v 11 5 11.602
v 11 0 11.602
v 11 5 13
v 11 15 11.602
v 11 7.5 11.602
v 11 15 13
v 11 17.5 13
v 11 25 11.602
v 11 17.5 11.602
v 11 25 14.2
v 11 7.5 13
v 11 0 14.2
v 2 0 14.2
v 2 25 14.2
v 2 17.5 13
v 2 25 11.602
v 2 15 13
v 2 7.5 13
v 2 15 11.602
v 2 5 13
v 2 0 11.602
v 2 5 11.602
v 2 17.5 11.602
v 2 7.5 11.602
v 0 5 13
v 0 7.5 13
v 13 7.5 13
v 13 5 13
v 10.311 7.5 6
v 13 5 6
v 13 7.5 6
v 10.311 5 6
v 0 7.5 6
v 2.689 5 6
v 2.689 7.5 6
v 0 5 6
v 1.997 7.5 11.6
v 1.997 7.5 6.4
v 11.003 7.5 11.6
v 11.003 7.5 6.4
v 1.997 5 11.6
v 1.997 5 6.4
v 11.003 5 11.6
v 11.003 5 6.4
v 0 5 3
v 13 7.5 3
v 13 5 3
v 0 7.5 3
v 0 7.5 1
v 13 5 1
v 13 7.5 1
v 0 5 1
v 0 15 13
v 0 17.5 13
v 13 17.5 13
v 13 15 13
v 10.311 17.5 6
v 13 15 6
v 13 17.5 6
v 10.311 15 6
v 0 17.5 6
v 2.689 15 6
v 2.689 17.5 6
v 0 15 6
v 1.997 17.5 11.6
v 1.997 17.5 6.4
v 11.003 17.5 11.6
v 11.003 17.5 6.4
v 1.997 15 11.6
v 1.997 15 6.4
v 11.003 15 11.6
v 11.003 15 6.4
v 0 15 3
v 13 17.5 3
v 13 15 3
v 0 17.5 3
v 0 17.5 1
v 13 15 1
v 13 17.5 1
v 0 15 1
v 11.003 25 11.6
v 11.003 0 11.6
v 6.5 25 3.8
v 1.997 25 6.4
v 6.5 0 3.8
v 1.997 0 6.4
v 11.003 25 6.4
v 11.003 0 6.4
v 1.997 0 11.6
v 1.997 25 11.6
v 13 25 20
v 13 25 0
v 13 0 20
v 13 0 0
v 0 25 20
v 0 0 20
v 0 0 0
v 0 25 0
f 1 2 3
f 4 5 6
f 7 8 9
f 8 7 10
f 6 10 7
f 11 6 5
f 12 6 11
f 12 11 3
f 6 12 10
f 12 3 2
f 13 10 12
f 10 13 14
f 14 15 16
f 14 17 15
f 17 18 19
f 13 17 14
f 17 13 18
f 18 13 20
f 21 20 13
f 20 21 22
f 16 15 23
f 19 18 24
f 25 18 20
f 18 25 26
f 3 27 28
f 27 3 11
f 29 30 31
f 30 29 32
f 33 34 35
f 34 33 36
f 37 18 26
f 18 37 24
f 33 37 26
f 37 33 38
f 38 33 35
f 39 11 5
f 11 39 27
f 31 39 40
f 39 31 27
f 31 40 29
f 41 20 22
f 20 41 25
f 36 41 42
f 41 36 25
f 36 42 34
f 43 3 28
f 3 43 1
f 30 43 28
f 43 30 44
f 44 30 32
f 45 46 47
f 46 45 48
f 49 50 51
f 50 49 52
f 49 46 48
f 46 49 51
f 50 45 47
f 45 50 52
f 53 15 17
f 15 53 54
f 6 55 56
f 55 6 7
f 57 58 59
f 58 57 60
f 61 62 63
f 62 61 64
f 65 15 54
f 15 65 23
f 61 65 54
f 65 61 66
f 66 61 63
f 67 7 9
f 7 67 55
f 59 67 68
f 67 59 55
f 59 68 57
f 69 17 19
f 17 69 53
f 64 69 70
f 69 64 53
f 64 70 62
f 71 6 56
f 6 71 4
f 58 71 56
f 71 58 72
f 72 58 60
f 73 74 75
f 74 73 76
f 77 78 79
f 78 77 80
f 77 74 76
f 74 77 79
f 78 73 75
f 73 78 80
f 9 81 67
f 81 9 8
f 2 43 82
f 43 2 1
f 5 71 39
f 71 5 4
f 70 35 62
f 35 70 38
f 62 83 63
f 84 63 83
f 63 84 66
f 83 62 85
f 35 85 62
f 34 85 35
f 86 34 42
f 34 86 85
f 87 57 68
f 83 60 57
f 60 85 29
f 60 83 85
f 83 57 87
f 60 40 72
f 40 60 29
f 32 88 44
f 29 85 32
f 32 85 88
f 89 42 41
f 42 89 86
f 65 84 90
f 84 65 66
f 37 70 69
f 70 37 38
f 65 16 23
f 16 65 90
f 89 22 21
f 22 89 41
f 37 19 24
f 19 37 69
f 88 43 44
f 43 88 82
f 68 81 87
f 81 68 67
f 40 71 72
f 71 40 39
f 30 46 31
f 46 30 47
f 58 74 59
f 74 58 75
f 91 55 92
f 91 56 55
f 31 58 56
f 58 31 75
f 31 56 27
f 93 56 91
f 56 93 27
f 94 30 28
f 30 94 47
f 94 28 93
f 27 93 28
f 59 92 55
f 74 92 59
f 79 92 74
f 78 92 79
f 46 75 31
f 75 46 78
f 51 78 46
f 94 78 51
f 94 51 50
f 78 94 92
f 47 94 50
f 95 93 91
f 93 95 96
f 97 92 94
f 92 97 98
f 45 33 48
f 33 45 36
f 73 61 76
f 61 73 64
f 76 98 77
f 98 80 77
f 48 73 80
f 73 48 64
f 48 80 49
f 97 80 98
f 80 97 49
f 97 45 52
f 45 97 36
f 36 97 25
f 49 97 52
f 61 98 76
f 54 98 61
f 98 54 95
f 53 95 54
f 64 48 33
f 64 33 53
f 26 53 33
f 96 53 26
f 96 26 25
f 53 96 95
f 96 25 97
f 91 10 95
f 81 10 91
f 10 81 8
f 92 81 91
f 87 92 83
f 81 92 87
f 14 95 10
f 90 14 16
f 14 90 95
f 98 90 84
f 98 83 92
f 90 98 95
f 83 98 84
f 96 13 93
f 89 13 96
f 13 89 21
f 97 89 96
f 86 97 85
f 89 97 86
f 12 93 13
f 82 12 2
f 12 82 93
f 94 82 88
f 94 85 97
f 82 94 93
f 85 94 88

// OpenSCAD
difference(){cube([13,25,20]);

//rotate([0, -90, 0])
translate([0,0,1]){
translate([2, -1, 8]) cube([9,60,5.2]);
translate([-1, 5, 5]) cube([15,2.5,7]);
translate([-1, 5, 0]) cube([15,2.5,2]);

translate([-1, 15, 5]) cube([15,2.5,7]);
translate([-1, 15, 0]) cube([15,2.5,2]);
translate([6.5, -1, 8]) rotate([-90, 0, 0]) rotate([0, 0, 30])  cylinder(h=70, r=5.2, $fn=6);
translate([6.5, -3, 8]) rotate([-90, 0, 0])  cylinder(h=70, r=4, $fn=30);
}}
